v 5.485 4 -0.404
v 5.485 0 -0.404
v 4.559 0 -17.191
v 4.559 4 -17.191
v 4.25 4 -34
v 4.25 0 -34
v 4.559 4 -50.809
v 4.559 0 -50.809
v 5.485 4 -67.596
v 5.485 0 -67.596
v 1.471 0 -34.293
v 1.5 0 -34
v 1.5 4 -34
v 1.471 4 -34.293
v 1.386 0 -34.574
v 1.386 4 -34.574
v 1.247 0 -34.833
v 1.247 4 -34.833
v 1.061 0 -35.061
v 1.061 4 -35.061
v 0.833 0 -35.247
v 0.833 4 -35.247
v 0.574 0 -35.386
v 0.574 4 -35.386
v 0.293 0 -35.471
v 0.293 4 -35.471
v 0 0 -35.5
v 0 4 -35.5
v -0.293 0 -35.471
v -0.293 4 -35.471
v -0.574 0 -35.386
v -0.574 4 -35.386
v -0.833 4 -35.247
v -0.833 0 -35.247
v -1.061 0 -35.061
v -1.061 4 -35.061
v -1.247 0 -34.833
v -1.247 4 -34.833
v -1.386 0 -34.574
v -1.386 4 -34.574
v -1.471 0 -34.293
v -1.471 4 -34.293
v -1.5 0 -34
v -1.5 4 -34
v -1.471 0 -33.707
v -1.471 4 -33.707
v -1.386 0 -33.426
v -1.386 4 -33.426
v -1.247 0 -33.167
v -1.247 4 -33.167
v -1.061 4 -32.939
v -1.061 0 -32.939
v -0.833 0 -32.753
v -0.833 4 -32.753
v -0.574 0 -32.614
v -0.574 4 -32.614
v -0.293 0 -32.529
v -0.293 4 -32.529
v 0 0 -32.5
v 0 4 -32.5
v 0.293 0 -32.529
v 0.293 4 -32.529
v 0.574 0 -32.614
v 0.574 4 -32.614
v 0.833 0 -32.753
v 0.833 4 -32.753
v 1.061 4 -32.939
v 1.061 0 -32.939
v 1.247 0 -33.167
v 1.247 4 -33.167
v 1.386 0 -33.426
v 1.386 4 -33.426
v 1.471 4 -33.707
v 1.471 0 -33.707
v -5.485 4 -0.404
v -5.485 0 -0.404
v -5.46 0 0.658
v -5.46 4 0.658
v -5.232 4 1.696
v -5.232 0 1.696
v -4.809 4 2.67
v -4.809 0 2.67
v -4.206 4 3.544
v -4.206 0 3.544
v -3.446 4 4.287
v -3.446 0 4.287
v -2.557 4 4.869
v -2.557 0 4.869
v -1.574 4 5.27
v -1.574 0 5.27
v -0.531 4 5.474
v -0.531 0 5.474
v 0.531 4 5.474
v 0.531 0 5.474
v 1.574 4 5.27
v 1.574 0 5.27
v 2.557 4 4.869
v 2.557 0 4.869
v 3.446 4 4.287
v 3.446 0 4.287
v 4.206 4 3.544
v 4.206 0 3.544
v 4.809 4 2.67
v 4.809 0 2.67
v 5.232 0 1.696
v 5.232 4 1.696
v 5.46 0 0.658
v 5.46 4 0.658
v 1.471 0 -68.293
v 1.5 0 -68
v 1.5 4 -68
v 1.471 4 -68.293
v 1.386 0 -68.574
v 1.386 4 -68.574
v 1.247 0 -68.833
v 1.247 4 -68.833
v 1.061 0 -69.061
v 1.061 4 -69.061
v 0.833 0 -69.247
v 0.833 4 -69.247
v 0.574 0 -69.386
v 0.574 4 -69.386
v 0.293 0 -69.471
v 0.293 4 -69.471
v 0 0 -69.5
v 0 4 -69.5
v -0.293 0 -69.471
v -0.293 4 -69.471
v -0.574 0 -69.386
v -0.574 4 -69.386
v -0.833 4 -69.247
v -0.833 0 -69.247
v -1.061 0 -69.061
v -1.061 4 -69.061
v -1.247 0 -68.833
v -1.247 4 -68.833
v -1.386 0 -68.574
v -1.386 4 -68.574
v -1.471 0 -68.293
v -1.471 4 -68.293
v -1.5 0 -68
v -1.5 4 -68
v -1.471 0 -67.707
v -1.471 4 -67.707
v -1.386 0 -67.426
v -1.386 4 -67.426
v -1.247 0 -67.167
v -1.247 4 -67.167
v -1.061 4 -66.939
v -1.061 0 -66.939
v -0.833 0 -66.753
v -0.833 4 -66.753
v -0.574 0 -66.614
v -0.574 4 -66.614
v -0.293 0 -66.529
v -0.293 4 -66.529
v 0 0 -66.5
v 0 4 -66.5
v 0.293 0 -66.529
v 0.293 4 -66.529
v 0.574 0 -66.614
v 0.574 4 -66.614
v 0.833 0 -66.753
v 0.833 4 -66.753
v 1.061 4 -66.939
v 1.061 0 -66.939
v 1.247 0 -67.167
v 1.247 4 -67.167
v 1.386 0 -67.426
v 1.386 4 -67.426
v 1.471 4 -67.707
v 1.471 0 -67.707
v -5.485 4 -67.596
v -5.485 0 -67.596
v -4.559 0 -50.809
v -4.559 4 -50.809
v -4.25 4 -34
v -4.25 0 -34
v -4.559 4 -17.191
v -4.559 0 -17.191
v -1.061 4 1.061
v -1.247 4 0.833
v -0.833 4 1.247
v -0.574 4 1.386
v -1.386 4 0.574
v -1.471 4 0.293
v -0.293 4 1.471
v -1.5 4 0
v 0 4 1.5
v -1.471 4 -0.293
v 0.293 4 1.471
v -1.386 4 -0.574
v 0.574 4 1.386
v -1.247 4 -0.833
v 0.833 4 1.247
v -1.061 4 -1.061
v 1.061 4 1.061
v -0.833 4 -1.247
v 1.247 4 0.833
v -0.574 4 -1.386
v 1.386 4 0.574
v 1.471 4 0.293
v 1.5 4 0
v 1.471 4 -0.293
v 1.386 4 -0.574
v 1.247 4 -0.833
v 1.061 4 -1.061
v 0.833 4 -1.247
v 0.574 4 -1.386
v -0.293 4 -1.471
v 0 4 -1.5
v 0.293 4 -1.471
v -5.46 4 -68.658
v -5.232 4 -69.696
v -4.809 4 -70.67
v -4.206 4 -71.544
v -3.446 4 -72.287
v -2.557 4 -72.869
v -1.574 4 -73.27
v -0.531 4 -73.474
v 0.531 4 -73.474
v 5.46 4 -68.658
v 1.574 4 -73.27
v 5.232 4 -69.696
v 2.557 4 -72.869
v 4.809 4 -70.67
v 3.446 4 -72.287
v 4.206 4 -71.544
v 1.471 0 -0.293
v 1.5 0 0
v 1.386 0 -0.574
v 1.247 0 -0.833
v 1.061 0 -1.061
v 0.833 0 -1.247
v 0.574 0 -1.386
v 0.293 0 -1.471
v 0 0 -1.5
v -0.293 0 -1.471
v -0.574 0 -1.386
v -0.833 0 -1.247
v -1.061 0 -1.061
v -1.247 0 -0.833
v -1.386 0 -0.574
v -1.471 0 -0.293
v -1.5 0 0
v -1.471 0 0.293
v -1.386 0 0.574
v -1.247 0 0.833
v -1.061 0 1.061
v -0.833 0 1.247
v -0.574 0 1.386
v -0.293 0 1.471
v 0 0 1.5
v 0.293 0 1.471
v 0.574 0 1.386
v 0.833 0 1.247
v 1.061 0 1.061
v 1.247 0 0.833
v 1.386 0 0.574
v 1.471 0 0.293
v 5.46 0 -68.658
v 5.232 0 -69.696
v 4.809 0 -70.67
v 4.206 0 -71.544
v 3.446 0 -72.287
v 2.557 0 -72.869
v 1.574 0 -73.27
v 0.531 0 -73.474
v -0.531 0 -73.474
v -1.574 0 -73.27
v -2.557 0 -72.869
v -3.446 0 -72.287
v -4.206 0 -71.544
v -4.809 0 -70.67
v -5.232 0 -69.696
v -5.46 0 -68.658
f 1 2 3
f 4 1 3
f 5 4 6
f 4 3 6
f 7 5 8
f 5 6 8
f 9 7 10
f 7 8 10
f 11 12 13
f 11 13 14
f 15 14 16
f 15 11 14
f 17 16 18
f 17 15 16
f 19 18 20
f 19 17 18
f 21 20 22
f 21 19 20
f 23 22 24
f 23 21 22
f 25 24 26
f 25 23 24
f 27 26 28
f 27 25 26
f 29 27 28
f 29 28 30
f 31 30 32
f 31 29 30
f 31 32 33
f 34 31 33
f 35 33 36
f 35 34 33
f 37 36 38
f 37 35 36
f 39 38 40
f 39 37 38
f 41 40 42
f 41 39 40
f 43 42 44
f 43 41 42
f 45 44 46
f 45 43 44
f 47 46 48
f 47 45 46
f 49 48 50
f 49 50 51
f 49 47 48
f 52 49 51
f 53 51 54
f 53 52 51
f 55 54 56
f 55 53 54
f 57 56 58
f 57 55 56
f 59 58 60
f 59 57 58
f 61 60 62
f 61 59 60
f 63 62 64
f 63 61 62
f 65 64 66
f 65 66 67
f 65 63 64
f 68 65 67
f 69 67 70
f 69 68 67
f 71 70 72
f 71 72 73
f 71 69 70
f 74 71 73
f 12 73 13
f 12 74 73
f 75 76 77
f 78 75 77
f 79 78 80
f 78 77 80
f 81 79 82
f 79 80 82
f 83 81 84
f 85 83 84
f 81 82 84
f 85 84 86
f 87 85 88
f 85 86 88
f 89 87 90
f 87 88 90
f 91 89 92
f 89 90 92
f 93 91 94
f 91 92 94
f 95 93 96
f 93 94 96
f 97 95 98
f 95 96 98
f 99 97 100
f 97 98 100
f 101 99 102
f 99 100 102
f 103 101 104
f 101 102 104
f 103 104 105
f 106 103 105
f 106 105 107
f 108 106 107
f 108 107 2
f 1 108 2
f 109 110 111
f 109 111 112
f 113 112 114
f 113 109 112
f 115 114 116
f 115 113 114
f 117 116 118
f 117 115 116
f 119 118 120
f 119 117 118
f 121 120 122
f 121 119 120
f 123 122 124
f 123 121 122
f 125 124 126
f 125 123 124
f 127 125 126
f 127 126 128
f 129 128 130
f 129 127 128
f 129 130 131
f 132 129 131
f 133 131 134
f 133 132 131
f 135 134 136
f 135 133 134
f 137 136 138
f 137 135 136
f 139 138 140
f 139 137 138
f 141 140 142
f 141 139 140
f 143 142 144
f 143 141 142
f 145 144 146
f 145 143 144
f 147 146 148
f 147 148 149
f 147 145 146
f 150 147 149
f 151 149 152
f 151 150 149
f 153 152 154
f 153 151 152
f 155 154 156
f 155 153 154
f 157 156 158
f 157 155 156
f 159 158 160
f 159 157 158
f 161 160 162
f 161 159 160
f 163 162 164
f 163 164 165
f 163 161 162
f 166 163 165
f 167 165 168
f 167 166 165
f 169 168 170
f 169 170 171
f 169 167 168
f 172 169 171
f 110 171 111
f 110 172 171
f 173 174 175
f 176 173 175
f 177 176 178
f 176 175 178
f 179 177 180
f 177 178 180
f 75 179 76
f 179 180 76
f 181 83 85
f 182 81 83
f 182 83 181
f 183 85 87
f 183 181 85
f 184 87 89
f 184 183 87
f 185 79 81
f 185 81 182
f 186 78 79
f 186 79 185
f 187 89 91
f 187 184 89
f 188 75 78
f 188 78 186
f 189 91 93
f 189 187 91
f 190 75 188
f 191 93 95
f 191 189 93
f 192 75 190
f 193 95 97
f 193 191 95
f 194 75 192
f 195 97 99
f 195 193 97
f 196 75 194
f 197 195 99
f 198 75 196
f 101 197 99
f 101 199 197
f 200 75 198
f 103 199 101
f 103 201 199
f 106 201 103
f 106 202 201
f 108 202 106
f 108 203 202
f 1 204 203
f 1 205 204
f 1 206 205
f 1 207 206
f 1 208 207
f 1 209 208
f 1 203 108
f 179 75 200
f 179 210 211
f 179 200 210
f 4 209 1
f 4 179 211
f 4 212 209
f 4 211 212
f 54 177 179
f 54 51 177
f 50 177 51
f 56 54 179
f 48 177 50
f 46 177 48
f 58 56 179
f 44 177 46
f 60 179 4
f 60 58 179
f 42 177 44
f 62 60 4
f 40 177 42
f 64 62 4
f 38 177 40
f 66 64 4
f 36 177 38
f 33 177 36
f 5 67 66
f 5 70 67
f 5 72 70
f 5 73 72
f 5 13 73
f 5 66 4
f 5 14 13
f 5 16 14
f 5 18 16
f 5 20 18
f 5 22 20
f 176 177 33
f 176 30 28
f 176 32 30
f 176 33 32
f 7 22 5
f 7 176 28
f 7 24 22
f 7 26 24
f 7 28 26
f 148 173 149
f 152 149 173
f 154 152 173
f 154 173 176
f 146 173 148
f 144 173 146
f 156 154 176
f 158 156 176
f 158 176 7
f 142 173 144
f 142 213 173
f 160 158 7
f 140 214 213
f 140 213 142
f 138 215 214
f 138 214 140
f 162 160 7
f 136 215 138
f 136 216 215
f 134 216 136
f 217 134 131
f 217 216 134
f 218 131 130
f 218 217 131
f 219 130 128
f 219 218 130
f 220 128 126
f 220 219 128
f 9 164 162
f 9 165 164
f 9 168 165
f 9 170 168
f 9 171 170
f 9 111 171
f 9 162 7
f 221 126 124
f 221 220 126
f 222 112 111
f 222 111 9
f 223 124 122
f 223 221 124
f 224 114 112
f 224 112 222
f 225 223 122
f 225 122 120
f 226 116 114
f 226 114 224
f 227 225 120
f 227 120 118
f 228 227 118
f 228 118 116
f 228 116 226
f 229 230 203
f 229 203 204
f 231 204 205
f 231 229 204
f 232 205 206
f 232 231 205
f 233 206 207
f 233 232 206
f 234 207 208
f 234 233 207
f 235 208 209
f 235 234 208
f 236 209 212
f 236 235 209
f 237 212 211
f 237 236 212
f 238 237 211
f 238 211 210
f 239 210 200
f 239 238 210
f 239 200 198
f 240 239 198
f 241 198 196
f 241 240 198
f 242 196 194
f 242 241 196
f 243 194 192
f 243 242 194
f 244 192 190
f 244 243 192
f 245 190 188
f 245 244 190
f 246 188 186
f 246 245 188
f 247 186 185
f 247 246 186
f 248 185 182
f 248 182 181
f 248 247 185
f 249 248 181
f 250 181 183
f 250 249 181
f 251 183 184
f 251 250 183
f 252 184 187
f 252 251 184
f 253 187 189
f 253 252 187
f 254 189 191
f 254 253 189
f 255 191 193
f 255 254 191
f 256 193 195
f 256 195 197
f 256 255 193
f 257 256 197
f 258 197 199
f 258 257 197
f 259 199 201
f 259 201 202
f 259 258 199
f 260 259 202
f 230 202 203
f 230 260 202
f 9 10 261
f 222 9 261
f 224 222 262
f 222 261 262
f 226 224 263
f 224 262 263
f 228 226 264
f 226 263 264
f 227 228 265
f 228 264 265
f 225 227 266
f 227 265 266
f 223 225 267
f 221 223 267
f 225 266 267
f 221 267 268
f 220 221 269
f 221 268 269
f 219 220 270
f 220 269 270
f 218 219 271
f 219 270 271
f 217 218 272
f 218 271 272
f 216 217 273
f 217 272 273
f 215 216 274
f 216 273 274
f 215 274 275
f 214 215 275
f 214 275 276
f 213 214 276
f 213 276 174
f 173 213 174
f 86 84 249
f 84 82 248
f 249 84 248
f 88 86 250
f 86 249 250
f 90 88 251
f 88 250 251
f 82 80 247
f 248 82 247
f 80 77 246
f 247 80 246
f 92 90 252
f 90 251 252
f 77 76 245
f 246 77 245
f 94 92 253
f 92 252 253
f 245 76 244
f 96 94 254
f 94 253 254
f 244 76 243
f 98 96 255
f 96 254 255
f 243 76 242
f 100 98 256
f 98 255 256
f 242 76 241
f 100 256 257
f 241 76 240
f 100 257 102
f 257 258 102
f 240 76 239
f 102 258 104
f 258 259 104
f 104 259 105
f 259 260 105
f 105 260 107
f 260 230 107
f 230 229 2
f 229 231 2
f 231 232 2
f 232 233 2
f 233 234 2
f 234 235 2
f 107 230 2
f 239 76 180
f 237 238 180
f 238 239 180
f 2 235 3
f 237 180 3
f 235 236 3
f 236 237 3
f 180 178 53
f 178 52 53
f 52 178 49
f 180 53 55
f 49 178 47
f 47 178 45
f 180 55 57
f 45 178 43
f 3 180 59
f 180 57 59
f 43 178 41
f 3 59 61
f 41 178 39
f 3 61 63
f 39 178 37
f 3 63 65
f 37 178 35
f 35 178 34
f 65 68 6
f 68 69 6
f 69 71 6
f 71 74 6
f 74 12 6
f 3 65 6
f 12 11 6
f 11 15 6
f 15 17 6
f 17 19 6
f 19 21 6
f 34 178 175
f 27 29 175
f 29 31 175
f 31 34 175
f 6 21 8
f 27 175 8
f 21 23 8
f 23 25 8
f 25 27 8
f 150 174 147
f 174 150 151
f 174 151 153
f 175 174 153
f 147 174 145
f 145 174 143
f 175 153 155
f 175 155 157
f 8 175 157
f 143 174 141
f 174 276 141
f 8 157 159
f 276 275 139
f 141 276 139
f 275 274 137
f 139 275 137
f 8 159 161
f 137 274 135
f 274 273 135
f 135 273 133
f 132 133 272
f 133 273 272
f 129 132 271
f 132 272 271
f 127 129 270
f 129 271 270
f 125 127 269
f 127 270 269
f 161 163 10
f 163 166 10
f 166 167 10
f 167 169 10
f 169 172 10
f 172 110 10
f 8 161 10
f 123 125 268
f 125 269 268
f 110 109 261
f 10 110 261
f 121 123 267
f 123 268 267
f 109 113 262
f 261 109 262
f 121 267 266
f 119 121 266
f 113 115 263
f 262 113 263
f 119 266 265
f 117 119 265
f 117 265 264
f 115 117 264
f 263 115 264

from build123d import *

# Parameters (mm, degrees)
SKETCH1_R           = 1.5
BOSS_EXTRUDE1_DEPTH = 4


with BuildPart() as part:
    # Sketch1 → Boss-Extrude1 (new body)
    with BuildSketch(Plane(origin=(0, 0, 0), x_dir=(1, 0, 0), z_dir=(0, 1, 0))):
        with BuildLine():
            ThreePointArc((-5.48515199, 0.403865882), (0, -5.5), (5.48515199, 0.403865882))
            ThreePointArc((5.48515199, 0.403865882), (4.25, 34), (5.48515199, 67.596134118))
            ThreePointArc((5.48515199, 67.596134118), (0, 73.5), (-5.48515199, 67.596134118))
            ThreePointArc((-5.48515199, 67.596134118), (-4.25, 34), (-5.48515199, 0.403865882))
        make_face()
        Circle(SKETCH1_R, mode=Mode.SUBTRACT)
        with Locations((0, 68)):
            Circle(SKETCH1_R, mode=Mode.SUBTRACT)
        with Locations((0, 34)):
            Circle(SKETCH1_R, mode=Mode.SUBTRACT)
    extrude(amount=BOSS_EXTRUDE1_DEPTH)


solid = part.part
